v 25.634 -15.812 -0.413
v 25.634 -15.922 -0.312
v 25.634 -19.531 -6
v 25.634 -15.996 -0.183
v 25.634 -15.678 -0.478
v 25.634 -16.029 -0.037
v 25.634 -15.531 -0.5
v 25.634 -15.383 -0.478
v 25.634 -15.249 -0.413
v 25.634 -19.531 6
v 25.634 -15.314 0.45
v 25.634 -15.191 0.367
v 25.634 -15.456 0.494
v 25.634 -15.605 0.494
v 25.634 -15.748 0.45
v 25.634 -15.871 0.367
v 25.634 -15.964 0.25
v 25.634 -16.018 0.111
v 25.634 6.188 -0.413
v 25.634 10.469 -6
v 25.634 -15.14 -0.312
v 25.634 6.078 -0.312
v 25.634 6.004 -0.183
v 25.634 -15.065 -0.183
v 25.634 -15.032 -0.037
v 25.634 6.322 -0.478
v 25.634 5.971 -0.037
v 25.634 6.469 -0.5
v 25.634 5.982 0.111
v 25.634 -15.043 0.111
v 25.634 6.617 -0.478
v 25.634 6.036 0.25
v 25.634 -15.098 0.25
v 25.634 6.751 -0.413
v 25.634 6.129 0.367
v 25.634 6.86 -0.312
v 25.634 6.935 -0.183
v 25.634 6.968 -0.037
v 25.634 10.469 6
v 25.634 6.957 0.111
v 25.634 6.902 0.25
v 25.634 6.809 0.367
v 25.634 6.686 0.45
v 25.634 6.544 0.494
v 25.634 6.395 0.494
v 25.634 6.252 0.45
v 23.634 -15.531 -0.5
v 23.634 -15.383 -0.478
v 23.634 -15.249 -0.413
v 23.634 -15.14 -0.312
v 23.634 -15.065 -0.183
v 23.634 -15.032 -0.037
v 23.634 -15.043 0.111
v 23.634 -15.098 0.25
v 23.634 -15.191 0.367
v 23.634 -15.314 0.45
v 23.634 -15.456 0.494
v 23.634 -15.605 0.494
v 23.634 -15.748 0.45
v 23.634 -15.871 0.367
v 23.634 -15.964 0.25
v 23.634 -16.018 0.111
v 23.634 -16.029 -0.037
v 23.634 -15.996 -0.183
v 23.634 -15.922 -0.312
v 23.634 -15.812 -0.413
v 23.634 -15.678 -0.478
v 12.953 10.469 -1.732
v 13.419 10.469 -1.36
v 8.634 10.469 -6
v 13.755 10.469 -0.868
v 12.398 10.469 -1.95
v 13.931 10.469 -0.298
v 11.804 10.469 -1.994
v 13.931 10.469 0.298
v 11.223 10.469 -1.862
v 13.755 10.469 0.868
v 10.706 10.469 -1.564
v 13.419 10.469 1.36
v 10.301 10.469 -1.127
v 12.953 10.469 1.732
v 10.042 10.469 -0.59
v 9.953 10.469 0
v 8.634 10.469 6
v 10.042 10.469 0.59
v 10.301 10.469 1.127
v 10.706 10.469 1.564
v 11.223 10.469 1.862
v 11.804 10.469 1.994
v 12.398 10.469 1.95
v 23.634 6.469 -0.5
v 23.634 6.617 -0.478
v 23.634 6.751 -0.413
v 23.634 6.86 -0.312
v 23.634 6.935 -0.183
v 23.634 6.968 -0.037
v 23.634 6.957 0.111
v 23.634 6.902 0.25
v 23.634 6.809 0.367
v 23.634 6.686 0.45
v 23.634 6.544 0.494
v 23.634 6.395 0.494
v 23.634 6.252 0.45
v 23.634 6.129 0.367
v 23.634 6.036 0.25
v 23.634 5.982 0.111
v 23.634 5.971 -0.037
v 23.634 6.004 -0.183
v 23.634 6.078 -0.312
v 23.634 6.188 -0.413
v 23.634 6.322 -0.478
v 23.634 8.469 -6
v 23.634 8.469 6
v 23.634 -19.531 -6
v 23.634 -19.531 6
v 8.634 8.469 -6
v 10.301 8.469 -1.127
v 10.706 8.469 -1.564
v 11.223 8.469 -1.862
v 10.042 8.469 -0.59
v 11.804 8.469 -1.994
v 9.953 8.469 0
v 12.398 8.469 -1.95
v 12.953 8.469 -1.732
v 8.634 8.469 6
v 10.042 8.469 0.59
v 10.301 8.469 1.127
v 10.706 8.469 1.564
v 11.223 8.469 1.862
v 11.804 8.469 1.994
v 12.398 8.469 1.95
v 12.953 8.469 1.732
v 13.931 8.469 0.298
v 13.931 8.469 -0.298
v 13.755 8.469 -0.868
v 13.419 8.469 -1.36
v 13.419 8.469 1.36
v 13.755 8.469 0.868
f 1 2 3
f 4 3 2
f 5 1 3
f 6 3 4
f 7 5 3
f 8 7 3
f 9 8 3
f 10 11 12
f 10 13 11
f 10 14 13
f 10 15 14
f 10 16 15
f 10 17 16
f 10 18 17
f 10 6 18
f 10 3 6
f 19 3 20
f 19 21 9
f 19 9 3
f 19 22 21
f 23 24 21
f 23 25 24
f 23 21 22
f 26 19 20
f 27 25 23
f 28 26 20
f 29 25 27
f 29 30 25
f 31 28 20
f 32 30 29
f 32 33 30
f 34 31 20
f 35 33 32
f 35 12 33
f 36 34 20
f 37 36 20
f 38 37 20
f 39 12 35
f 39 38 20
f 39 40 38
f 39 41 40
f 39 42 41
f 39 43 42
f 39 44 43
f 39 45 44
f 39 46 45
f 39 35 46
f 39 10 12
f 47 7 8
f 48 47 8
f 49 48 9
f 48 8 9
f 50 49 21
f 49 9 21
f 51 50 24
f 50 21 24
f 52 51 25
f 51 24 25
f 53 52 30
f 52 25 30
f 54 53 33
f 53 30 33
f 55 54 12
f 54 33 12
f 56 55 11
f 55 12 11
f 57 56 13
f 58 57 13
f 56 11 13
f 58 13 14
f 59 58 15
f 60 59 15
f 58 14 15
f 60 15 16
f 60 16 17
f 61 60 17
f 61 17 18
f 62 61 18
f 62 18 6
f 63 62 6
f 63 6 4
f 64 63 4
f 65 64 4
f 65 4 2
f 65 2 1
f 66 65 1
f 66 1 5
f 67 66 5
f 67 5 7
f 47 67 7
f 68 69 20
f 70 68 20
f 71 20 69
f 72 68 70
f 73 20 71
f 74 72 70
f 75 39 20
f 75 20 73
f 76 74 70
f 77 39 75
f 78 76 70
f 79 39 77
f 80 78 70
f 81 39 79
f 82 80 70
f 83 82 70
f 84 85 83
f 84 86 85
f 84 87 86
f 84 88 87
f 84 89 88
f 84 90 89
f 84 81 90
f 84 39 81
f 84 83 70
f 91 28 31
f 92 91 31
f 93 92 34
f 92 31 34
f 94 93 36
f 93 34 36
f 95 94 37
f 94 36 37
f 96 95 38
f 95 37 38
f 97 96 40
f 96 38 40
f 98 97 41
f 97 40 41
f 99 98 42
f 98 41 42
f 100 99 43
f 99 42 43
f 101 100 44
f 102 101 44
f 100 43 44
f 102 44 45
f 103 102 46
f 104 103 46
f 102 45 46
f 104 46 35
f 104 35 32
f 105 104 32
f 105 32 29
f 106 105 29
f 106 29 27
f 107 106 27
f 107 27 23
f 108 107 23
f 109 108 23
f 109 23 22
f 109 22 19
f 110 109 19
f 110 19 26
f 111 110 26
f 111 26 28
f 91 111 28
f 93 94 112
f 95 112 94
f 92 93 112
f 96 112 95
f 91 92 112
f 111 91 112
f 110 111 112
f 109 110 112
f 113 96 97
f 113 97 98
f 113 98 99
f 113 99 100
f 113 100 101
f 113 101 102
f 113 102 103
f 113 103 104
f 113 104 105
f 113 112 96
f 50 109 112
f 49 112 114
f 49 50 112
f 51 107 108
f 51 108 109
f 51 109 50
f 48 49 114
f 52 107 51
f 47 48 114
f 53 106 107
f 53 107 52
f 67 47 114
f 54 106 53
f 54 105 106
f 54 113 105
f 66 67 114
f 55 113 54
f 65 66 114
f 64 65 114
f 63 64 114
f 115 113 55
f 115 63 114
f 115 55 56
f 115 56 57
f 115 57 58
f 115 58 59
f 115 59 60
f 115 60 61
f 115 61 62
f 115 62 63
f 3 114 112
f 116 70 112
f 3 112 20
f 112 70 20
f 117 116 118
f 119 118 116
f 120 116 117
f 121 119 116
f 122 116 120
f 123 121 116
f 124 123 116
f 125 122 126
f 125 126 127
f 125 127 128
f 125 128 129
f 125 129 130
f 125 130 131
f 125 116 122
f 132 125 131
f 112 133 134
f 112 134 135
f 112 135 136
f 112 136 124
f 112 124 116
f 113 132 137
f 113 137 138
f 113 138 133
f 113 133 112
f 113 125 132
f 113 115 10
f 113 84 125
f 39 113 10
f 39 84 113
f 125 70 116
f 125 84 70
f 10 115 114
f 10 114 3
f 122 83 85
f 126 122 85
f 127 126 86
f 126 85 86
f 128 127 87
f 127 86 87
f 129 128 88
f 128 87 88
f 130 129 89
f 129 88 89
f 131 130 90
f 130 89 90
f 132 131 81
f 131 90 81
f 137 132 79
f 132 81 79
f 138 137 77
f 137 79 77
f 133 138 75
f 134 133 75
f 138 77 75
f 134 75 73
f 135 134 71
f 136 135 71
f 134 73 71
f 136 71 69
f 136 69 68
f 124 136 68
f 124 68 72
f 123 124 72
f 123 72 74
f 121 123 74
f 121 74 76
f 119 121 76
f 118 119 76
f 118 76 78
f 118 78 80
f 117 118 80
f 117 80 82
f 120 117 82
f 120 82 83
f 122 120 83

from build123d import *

# Parameters (mm, degrees)
BOSS_EXTRUDE1_DEPTH = 6
SKETCH2_R           = 2
CUT_EXTRUDE1_DEPTH  = 10
CUT_EXTRUDE2_REACH  = 28.579
SKETCH3_R           = 0.5


with BuildPart() as part:
    # Sketch1 → Boss-Extrude1 (new, symmetric)
    with BuildSketch(Plane.XY):
        Polygon((8.63397831, 8.469387755), (23.63397831, 8.469387755), (23.63397831, -19.530612245), (25.63397831, -19.530612245), (25.63397831, 10.469387755), (8.63397831, 10.469387755), align=None)
    extrude(amount=BOSS_EXTRUDE1_DEPTH, both=True)

    # Sketch2 → Cut-Extrude1 (cut)
    with BuildSketch(Plane(origin=(0, 10.469387755, 0), x_dir=(1, 0, 0), z_dir=(0, 1, 0))):
        with Locations(Location((11.953216886, 0, 0), (0, 0, 180))):
            Circle(SKETCH2_R)
    extrude(amount=-CUT_EXTRUDE1_DEPTH, mode=Mode.SUBTRACT)

    # Sketch3 → Cut-Extrude2 (cut, up to next)
    with BuildSketch(Plane(origin=(25.63397831, 0, 0), x_dir=(0, 0, -1), z_dir=(1, 0, 0)), mode=Mode.PRIVATE) as cut_extrude2_sk1:
        with Locations((0, -15.530612245)):
            Circle(SKETCH3_R)
    cut_extrude2_tool1 = extrude(cut_extrude2_sk1.sketch, amount=-CUT_EXTRUDE2_REACH, mode=Mode.PRIVATE) & part.part
    # Sketch3 → Cut-Extrude2 (cut, up to next)
    with BuildSketch(Plane(origin=(25.63397831, 0, 0), x_dir=(0, 0, -1), z_dir=(1, 0, 0)), mode=Mode.PRIVATE) as cut_extrude2_sk2:
        with Locations((0, 6.469387755)):
            Circle(SKETCH3_R)
    cut_extrude2_tool2 = extrude(cut_extrude2_sk2.sketch, amount=-CUT_EXTRUDE2_REACH, mode=Mode.PRIVATE) & part.part
    add(cut_extrude2_tool1.solids().sort_by_distance((25.633978, -15.530612, 0))[0], mode=Mode.SUBTRACT)
    add(cut_extrude2_tool2.solids().sort_by_distance((25.633978, 6.469388, 0))[0], mode=Mode.SUBTRACT)


solid = part.part
